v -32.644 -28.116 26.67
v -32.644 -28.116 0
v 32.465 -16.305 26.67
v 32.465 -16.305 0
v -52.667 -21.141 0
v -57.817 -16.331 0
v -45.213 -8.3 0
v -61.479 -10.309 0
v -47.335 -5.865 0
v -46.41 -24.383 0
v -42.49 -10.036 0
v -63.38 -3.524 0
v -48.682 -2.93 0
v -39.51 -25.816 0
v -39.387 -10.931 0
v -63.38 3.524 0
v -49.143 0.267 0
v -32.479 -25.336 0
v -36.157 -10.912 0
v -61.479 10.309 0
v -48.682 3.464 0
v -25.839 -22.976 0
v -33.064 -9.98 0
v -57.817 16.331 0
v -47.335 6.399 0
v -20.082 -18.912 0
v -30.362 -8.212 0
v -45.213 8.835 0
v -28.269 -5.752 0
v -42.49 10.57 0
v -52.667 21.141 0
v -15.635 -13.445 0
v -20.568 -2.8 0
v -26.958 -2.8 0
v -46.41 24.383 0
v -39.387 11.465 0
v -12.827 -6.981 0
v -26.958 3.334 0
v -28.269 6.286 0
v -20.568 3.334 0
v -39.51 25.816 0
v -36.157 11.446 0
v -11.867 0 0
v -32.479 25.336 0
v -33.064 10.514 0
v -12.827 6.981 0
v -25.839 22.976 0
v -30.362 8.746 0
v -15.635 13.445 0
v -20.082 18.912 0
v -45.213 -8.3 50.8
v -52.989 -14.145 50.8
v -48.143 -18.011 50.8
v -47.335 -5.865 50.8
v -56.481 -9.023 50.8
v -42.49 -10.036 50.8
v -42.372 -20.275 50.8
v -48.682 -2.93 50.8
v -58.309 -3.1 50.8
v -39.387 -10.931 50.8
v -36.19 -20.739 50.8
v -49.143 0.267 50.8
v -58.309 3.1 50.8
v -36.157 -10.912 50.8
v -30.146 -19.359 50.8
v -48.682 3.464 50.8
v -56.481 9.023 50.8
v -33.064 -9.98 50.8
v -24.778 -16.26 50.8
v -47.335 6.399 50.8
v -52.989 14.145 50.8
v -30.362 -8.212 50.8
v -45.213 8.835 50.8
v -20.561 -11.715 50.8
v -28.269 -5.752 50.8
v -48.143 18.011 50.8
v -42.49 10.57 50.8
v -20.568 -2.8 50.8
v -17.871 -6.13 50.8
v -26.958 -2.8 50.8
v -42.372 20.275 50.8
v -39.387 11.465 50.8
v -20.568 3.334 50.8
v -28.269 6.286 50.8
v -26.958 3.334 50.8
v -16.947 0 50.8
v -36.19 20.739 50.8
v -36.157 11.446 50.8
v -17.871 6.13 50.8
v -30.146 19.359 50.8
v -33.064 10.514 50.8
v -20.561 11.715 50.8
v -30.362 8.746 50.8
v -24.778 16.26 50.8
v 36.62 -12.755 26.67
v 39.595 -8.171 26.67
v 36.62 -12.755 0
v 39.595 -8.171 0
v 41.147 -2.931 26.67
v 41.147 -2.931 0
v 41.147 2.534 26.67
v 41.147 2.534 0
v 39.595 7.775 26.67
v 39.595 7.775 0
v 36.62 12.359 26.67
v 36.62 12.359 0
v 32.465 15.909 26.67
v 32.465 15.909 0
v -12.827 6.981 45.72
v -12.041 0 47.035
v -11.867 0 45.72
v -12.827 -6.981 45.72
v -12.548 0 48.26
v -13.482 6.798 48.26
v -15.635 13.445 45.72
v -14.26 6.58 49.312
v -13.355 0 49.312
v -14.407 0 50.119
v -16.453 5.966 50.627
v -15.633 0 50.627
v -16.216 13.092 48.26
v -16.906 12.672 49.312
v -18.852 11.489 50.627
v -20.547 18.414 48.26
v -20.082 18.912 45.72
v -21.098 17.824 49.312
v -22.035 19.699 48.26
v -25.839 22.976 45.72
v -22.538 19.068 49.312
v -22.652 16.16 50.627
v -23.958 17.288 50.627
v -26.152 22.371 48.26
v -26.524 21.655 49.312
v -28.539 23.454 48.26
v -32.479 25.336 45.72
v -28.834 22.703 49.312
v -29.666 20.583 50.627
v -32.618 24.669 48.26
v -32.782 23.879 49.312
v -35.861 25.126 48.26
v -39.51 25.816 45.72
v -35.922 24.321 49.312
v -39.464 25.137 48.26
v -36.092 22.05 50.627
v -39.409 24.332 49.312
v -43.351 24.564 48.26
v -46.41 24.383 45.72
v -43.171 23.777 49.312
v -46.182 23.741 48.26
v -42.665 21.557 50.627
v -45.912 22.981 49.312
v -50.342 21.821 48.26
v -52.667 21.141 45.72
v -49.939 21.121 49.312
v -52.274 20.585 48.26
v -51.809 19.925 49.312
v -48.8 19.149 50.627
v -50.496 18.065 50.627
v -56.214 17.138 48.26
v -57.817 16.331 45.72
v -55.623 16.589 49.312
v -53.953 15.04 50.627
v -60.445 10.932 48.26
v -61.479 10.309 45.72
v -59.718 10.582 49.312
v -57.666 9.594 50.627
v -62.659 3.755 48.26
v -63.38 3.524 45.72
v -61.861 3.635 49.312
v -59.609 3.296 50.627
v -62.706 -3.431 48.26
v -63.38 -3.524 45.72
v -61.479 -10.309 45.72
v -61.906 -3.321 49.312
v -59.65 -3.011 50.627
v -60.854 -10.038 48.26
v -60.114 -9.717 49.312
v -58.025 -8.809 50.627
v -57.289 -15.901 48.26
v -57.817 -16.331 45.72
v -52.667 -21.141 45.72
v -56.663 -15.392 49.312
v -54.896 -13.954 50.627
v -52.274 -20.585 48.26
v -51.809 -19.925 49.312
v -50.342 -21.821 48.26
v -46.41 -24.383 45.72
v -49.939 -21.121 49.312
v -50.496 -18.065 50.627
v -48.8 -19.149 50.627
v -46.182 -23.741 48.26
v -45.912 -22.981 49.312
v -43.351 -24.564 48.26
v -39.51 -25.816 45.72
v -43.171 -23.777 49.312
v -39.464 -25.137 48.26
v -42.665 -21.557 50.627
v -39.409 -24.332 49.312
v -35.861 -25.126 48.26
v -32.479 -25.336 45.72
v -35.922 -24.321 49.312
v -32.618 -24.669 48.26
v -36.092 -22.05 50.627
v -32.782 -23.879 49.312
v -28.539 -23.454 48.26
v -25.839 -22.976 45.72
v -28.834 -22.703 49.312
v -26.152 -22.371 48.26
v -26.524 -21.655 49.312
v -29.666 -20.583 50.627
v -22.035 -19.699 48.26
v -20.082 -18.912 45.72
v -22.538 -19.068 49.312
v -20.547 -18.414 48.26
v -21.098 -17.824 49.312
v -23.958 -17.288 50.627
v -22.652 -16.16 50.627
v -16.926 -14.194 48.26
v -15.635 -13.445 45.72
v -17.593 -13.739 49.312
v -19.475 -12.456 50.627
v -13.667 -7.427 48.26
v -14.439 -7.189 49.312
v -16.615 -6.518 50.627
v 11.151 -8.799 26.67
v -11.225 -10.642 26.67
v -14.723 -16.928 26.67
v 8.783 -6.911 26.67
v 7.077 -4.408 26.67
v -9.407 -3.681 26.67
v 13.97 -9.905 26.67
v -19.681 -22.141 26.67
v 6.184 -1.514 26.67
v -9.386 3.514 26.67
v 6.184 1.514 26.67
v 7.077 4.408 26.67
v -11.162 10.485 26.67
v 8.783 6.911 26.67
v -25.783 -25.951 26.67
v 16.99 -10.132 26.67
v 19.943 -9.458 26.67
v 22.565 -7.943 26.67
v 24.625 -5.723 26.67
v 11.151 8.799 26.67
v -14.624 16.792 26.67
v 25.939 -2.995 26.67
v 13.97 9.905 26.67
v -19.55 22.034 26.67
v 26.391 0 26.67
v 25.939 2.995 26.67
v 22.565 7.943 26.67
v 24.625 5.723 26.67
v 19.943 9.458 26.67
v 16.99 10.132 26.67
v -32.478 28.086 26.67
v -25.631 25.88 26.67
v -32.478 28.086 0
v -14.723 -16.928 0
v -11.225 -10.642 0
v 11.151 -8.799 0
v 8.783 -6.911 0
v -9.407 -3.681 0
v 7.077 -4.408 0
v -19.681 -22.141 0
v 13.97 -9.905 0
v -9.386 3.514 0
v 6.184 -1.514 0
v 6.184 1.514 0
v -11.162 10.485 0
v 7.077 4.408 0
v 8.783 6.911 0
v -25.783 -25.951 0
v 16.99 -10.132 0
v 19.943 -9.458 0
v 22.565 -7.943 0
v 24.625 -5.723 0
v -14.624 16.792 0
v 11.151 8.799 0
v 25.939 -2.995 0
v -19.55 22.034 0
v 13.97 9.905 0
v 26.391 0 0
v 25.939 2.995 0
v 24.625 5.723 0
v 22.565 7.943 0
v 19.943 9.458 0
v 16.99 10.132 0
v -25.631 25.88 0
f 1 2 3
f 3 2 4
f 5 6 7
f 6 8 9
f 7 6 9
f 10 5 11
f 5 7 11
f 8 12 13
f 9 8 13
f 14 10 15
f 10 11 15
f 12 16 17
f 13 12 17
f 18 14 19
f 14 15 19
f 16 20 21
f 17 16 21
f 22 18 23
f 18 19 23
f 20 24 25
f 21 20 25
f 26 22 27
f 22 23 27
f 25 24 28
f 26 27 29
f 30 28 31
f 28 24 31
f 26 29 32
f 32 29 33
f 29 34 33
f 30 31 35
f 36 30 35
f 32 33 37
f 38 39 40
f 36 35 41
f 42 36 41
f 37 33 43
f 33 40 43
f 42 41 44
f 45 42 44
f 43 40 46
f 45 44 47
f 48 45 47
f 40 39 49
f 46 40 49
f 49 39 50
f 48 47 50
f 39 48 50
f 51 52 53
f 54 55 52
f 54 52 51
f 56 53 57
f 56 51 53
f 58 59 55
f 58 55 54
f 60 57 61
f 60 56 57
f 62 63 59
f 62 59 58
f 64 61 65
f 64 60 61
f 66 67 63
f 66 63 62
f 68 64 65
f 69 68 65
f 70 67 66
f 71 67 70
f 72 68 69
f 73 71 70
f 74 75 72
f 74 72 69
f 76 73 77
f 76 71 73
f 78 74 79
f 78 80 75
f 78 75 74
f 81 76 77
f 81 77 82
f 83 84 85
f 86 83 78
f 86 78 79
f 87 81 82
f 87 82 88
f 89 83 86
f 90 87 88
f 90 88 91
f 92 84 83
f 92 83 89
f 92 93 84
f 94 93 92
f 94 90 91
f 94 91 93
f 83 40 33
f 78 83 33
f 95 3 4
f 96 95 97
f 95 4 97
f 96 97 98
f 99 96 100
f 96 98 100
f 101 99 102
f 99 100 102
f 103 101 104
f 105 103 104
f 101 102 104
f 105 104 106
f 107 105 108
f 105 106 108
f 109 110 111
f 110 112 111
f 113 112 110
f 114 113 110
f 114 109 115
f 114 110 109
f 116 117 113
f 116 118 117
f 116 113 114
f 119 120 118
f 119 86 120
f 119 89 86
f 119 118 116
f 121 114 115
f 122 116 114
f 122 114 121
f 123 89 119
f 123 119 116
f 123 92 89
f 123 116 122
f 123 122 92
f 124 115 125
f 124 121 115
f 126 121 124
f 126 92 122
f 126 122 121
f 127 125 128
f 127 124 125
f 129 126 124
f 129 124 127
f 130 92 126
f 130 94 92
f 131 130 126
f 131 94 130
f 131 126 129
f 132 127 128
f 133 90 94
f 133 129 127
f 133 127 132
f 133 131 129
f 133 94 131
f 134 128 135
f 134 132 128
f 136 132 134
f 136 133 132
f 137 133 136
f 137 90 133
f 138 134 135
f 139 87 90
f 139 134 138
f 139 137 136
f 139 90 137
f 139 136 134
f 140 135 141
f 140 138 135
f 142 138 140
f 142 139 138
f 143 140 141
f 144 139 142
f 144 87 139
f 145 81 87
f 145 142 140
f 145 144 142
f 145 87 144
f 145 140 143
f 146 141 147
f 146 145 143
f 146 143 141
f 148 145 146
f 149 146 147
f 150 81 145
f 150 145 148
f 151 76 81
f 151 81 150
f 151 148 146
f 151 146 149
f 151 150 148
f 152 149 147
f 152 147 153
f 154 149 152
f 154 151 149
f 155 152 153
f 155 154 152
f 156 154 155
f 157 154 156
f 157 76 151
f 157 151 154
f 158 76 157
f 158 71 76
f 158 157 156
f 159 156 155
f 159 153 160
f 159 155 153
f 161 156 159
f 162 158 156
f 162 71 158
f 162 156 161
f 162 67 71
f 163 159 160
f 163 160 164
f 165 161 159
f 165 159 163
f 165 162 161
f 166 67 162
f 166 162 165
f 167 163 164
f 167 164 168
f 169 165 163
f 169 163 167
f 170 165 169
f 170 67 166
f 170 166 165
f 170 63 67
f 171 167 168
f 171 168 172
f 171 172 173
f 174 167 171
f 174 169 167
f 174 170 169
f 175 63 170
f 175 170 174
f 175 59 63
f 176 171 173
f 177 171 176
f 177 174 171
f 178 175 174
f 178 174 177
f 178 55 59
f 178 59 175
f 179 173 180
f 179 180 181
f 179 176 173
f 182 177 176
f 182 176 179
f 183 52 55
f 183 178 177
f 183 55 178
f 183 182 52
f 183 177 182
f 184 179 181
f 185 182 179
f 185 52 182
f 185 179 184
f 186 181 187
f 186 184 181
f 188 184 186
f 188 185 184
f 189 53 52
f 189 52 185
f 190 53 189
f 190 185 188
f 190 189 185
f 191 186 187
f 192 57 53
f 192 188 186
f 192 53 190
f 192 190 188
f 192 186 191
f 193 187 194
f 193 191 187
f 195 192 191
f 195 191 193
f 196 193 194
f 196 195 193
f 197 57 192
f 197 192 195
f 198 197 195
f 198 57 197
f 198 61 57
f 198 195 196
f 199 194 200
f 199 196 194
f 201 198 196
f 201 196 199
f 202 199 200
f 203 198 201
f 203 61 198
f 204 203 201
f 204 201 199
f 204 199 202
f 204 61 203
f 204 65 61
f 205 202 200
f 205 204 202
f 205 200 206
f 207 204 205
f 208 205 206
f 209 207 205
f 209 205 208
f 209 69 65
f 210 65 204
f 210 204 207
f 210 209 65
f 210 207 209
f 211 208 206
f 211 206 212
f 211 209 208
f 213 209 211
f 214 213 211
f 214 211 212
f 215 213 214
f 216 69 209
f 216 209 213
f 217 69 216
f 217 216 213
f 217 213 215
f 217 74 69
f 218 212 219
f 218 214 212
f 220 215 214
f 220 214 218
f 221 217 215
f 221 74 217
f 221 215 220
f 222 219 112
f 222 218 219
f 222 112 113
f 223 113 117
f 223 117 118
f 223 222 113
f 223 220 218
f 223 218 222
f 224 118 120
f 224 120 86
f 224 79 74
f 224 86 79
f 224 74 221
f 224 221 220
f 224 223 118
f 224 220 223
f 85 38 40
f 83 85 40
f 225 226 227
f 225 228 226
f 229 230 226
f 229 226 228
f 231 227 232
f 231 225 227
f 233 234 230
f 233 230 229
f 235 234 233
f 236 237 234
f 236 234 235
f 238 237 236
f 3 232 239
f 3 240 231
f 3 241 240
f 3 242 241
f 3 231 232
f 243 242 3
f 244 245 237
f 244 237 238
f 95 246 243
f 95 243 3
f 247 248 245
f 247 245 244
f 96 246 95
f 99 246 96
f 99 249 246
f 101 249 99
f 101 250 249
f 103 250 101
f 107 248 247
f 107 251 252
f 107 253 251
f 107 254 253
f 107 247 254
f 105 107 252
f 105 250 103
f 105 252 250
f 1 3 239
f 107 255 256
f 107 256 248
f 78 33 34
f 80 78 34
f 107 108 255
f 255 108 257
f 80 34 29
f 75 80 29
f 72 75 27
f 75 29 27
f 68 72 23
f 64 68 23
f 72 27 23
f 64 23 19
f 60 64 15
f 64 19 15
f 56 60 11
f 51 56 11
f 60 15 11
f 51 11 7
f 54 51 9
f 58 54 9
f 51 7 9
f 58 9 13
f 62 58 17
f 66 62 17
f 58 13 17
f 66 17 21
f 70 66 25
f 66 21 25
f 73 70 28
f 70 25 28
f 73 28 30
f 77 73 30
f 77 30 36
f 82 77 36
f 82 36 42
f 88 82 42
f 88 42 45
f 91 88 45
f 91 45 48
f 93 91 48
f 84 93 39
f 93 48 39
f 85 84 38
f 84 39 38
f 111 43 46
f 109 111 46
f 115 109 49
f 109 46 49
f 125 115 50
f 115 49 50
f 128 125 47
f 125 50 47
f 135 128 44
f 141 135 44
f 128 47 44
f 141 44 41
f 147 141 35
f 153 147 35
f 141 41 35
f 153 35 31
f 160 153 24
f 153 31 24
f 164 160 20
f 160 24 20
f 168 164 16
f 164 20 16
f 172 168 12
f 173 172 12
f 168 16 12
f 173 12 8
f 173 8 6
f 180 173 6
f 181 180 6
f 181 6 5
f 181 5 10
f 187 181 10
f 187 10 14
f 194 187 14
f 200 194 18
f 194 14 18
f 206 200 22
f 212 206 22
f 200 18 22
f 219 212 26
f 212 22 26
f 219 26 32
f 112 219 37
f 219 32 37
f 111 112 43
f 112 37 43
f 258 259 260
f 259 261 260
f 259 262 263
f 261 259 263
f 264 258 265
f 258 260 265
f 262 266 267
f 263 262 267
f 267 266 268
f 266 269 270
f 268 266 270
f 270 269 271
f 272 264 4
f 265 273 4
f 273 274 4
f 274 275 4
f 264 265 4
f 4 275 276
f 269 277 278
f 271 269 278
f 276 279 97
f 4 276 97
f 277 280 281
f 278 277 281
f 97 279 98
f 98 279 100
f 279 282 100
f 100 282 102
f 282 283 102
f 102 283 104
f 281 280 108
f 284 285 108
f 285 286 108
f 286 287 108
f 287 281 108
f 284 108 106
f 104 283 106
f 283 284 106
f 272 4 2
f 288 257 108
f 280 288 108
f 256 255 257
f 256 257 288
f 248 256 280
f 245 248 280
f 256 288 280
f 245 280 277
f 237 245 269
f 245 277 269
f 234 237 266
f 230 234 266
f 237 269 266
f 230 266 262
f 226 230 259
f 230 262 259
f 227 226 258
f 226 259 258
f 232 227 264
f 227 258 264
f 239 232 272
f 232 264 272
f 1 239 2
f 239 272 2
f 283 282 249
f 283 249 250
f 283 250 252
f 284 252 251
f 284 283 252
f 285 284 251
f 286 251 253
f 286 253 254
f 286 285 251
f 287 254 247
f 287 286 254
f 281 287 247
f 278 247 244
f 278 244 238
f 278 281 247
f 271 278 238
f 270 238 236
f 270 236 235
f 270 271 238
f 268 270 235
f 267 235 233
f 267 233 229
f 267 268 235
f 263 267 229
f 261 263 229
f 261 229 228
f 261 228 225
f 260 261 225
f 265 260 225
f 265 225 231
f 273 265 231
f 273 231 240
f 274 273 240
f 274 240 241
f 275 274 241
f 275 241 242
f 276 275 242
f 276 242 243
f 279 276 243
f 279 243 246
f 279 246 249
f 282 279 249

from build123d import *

# Parameters (mm, degrees)
F0_R     = 25.8767860188
F1_DEPTH = 50.8
F0_R_2   = 10.16
F2_DEPTH = 24.13
F3_R     = 5.08


with BuildPart() as f1:
    # F0 (on Top) → F1 (new body)
    with BuildSketch(Plane.XY):
        with Locations((-37.7442430894, 0)):
            Circle(F0_R)
        with BuildLine():
            ThreePointArc((-26.9576869905, -2.8002713807), (-49.1428781175, 0.2670810791), (-26.9576869905, 3.3344335388))
            Line((-26.9576869905, 3.3344335388), (-20.5678781175, 3.3344335388))
            Line((-20.5678781175, 3.3344335388), (-20.5678781175, -2.8002713807))
            Line((-20.5678781175, -2.8002713807), (-26.9576869905, -2.8002713807))
        make_face(mode=Mode.SUBTRACT)
    extrude(amount=F1_DEPTH)

    # F3
    f3_edges = [f1.edges().sort_by_distance(p)[0] for p in [
        (-63.621029, 0, 50.8),
    ]]
    fillet(f3_edges, radius=F3_R)


with BuildPart() as f1b:
    # F0 (on Top) → F1, piece 2 (new body)
    with BuildSketch(Plane.XY):
        with BuildLine():
            Line((-32.6440138166, -28.1161570341), (32.4653702854, -16.3054111227))
            ThreePointArc((32.4653702854, -16.3054111227), (41.3439072256, -0.1981506721), (32.4653702854, 15.9091097785))
            Line((32.4653702854, 15.9091097785), (-32.4783887587, 28.0856084707))
            ThreePointArc((-32.4783887587, 28.0856084707), (-9.1693671705, -0.0842093737), (-32.6440138166, -28.1161570341))
        make_face()
        with Locations((16.2307569106, 0)):
            Circle(F0_R_2, mode=Mode.SUBTRACT)
    extrude(amount=F1_DEPTH)

    # F2 (cut): a face of the model
    f2_faces = [f1b.faces().sort_by_distance(p)[0] for p in [
        (-8.2402398416, -0.0869474864, 50.8),
    ]]
    extrude(f2_faces, amount=-F2_DEPTH, mode=Mode.SUBTRACT)


solid = Compound([f1.part, f1b.part])
